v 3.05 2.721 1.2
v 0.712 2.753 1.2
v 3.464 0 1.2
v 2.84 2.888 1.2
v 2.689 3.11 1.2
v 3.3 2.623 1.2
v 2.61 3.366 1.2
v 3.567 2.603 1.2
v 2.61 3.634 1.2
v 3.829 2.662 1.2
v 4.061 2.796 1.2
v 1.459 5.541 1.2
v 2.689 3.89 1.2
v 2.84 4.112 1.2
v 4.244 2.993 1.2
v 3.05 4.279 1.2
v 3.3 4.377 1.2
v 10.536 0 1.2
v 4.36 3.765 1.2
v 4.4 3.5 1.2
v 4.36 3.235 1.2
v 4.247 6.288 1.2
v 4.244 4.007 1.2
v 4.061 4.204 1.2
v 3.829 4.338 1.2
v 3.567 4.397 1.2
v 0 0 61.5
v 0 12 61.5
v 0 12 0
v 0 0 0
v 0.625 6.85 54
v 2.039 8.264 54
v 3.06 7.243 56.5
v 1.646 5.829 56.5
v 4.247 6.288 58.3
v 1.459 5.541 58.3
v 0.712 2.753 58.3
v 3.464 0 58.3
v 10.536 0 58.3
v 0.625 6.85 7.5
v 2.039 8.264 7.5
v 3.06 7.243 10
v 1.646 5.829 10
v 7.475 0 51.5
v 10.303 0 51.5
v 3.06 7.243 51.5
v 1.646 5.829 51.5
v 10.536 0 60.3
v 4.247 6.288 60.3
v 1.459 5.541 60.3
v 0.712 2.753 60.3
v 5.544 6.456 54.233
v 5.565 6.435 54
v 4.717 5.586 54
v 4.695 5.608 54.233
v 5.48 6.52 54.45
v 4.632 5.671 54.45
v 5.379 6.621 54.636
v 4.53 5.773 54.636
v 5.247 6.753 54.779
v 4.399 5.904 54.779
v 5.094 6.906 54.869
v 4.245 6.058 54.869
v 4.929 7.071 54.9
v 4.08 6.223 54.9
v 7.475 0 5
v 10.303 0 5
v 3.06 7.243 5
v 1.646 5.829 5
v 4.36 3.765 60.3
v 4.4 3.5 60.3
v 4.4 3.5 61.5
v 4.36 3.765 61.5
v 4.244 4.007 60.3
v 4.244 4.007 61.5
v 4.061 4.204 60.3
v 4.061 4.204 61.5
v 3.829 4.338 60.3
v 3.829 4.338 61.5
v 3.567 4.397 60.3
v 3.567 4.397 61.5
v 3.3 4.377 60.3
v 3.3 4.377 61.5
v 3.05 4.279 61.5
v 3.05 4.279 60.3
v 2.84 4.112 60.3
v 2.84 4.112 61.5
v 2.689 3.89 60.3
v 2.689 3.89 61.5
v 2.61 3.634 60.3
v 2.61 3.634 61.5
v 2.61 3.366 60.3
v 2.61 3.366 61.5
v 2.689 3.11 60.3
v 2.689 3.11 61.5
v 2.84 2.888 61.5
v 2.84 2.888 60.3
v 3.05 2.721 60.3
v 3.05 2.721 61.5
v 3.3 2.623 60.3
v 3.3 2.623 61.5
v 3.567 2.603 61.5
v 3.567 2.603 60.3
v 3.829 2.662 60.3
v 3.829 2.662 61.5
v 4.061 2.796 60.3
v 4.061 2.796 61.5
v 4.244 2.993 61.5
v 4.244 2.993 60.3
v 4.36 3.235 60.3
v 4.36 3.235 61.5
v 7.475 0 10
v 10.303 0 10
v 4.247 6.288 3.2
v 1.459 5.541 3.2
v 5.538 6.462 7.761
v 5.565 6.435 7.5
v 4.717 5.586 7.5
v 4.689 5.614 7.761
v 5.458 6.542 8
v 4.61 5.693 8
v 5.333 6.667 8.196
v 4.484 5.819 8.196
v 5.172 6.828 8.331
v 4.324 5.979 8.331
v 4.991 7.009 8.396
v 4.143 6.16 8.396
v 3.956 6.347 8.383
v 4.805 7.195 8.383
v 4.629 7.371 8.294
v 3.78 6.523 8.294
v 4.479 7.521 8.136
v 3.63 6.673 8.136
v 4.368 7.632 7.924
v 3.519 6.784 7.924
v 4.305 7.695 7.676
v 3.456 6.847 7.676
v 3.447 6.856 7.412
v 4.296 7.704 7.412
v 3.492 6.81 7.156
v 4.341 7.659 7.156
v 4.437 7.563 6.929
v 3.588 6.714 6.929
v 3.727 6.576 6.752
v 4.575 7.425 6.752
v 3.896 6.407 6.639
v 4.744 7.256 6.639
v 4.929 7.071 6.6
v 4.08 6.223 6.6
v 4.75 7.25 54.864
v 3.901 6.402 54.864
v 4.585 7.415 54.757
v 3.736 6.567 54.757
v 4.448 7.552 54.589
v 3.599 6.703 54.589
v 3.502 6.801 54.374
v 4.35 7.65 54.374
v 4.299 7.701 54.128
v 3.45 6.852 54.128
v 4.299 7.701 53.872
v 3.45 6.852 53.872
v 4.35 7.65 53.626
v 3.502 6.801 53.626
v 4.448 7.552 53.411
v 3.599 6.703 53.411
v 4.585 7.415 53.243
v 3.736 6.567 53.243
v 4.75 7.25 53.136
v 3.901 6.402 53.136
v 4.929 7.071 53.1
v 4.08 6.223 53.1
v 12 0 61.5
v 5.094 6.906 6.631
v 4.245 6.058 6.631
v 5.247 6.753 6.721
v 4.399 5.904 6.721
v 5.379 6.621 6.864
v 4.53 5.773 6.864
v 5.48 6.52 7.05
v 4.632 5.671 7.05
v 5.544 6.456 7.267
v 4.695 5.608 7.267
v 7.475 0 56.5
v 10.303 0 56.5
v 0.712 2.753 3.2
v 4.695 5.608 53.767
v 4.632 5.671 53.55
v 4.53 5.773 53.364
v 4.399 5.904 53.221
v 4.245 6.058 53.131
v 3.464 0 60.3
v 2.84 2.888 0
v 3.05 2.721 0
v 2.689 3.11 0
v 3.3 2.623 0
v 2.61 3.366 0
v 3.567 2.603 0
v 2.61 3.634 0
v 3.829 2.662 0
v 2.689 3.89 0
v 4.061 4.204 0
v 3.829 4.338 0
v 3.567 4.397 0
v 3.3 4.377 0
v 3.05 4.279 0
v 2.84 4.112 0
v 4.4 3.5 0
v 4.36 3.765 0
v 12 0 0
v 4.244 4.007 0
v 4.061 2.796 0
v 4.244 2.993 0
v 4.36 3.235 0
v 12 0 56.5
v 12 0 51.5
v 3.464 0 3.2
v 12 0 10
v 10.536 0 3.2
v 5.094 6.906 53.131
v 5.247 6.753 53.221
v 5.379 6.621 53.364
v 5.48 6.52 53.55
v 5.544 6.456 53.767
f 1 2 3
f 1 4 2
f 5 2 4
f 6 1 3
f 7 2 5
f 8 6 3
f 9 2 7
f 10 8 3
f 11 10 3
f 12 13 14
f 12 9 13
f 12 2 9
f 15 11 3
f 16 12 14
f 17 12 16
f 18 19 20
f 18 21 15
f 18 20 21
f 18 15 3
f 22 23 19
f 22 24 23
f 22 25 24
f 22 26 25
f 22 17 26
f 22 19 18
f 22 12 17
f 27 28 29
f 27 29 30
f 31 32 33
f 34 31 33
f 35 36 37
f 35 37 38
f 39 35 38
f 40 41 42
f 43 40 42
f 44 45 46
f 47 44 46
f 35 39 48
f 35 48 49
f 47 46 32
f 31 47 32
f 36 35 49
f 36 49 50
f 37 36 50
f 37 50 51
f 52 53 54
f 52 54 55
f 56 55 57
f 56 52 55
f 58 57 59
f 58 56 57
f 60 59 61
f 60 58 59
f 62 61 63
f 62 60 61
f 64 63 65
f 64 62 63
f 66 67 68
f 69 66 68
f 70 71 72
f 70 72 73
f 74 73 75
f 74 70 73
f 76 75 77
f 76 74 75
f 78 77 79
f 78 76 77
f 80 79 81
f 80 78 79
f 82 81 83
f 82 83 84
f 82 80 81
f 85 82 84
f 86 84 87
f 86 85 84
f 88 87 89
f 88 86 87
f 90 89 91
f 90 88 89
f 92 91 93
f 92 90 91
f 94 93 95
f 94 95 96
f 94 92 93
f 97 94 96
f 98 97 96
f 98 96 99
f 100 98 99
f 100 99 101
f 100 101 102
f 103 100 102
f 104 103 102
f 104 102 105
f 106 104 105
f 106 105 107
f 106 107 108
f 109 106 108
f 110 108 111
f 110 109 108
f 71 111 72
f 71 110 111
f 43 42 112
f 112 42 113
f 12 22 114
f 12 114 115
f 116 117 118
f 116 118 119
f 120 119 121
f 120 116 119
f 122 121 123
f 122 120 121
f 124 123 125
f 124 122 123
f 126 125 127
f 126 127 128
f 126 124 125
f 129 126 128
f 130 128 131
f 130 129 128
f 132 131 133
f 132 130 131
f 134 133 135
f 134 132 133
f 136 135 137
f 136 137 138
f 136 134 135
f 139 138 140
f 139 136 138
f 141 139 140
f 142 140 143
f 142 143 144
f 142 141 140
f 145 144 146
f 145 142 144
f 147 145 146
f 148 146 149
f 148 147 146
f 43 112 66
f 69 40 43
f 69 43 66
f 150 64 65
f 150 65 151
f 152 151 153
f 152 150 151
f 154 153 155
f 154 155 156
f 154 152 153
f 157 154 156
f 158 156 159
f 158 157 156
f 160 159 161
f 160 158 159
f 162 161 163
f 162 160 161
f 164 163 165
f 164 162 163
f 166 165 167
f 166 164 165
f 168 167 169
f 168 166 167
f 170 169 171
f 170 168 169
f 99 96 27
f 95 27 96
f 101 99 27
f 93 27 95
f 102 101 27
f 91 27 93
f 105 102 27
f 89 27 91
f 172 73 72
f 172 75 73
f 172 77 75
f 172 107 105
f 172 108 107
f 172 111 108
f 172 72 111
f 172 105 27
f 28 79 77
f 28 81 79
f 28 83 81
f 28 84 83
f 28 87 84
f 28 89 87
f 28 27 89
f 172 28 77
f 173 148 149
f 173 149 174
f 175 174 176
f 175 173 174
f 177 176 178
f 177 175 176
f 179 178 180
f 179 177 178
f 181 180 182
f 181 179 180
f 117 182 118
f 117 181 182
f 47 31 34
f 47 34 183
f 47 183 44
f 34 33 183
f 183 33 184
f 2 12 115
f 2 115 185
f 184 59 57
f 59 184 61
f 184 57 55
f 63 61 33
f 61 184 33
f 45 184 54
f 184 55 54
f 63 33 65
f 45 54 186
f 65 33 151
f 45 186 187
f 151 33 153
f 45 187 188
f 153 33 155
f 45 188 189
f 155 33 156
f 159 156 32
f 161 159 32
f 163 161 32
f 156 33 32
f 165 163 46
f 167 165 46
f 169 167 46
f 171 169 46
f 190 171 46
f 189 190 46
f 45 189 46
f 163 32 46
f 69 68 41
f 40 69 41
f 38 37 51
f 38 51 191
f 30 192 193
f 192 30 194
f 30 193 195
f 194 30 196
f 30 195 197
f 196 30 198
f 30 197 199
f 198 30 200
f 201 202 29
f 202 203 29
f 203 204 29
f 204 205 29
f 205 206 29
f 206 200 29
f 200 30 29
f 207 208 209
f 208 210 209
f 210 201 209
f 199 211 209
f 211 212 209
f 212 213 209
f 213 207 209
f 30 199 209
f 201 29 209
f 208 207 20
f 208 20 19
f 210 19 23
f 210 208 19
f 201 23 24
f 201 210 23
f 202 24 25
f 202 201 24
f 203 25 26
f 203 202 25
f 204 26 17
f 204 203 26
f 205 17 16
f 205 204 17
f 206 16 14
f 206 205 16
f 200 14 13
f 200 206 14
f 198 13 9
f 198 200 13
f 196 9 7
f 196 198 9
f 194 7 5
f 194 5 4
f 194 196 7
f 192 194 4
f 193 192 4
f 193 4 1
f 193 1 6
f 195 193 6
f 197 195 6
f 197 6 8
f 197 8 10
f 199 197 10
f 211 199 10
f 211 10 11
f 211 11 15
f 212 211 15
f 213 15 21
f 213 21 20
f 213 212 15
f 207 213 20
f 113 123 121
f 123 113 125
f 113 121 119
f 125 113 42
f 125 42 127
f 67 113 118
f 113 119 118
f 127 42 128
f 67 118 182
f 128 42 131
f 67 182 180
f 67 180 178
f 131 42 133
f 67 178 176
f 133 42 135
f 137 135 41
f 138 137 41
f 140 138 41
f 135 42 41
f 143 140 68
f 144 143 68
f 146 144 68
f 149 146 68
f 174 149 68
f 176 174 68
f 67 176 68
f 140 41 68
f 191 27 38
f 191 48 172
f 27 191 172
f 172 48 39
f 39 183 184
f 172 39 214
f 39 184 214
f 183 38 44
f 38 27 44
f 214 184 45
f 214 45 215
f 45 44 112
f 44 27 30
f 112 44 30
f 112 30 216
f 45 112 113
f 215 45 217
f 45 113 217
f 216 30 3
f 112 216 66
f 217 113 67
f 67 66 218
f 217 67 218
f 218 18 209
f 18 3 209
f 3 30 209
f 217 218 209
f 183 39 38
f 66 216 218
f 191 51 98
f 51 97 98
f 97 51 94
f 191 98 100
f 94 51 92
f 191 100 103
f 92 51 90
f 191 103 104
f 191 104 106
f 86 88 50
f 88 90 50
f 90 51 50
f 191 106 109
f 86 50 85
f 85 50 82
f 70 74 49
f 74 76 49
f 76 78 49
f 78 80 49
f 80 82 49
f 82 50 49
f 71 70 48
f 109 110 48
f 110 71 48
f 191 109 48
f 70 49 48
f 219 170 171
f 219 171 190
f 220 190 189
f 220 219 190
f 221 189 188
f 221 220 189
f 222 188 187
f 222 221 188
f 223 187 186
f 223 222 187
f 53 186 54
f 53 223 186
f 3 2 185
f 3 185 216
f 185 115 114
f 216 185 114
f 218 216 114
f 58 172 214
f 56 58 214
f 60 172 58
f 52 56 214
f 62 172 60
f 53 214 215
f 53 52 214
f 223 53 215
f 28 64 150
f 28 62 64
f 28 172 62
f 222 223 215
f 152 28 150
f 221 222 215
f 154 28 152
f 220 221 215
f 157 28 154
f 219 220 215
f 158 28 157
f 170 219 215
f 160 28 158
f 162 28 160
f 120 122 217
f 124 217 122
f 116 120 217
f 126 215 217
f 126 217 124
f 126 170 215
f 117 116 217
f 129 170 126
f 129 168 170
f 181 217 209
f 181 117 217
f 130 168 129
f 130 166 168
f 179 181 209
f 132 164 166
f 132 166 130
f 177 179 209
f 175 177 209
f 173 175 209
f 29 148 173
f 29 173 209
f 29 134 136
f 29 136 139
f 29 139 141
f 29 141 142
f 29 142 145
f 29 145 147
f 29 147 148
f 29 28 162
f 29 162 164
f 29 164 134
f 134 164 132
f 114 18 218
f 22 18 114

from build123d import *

# Parameters (mm, degrees)
BOSS_EXTRUDE1_DEPTH = 61.5
CUT_EXTRUDE1_DEPTH  = 3.2
SKETCH1_5_R         = 0.9
BOSS_EXTRUDE2_DEPTH = 1.2
CUT_EXTRUDE2_DEPTH  = 3.2
BOSS_EXTRUDE3_START = -1.2
SKETCH2_4_R         = 0.9
BOSS_EXTRUDE3_DEPTH = 1.2
CUT_EXTRUDE3_DEPTH  = 3.2
SKETCH4_3_R         = 0.9
BOSS_EXTRUDE4_DEPTH = 1.2
CUT_EXTRUDE4_DEPTH  = 64.798510954


with BuildPart() as part:
    # Sketch1 → Boss-Extrude1 (new body)
    with BuildSketch(Plane.XY):
        Polygon((12, 0), (0, 12), (0, 0), align=None)
    extrude(amount=BOSS_EXTRUDE1_DEPTH)

    # Sketch1<4> → Cut-Extrude1 (cut)
    with BuildSketch(Plane.XY):
        Polygon((10.535533906, 0), (4.247146227, 6.288387679), (1.458758548, 5.541241452), (0.711612321, 2.752853773), (3.464466094, 0), align=None)
    extrude(amount=CUT_EXTRUDE1_DEPTH, mode=Mode.SUBTRACT)

    # Sketch1<5> → Boss-Extrude2 (add)
    with BuildSketch(Plane.XY):
        Polygon((10.535533906, 0), (4.247146227, 6.288387679), (1.458758548, 5.541241452), (0.711612321, 2.752853773), (3.464466094, 0), align=None)
        with Locations((3.5, 3.5)):
            Circle(SKETCH1_5_R, mode=Mode.SUBTRACT)
    extrude(amount=BOSS_EXTRUDE2_DEPTH)

    # Sketch2 → Cut-Extrude2 (cut)
    with BuildSketch(Plane.XY.offset(61.5)):
        Polygon((0.711612321, 2.752853773), (3.464466094, 0), (10.535533906, 0), (4.247146227, 6.288387679), (1.458758548, 5.541241452), align=None)
    extrude(amount=-CUT_EXTRUDE2_DEPTH, mode=Mode.SUBTRACT)

    # Sketch2<4> → Boss-Extrude3 (add)
    with BuildSketch(Plane.XY.offset(61.5).offset(BOSS_EXTRUDE3_START)):
        Polygon((0.711612321, 2.752853773), (3.464466094, 0), (10.535533906, 0), (4.247146227, 6.288387679), (1.458758548, 5.541241452), align=None)
        with Locations((3.5, 3.5)):
            Circle(SKETCH2_4_R, mode=Mode.SUBTRACT)
    extrude(amount=BOSS_EXTRUDE3_DEPTH)

    # Sketch4 → Cut-Extrude3 (cut)
    with BuildSketch(Plane(origin=(6, 6, 0), x_dir=(0, 0, -1), z_dir=(0.7071067811865477, 0.7071067811865475, 0))):
        Polygon((-51.5, -8.485281374), (-51.5, 2.958094299), (-54, 4.401469972), (-56.5, 2.958094299), (-56.5, -8.485281374), align=None)
        Polygon((-5, -8.485281374), (-5, 2.958094299), (-7.5, 4.401469972), (-10, 2.958094299), (-10, -8.485281374), align=None)
    extrude(amount=-CUT_EXTRUDE3_DEPTH, mode=Mode.SUBTRACT)

    # Sketch4<3> → Boss-Extrude4 (add)
    # profile 1 of 2: a face of its own
    with BuildSketch(Plane(origin=(6, 6, 0), x_dir=(0, 0, -1), z_dir=(0.7071067811865477, 0.7071067811865475, 0))):
        Polygon((-51.5, -8.485281374), (-51.5, 2.958094299), (-54, 4.401469972), (-56.5, 2.958094299), (-56.5, -8.485281374), align=None)
        with Locations((-54, 1.514718626)):
            Circle(SKETCH4_3_R, mode=Mode.SUBTRACT)
    # profile 2 of 2: a face of its own
    with BuildSketch(Plane(origin=(6, 6, 0), x_dir=(0, 0, -1), z_dir=(0.7071067811865477, 0.7071067811865475, 0))):
        Polygon((-5, -8.485281374), (-5, 2.958094299), (-7.5, 4.401469972), (-10, 2.958094299), (-10, -8.485281374), align=None)
        with Locations((-7.5, 1.514718626)):
            Circle(SKETCH4_3_R, mode=Mode.SUBTRACT)
    extrude(amount=-BOSS_EXTRUDE4_DEPTH)

    # Sketch1<6> → Cut-Extrude4 (cut, through all)
    with BuildSketch(Plane.XY):
        Polygon((12, -2.237434652), (12, 0), (10.535533906, 0), (7, 0), (3.5, 0), (3.464466094, 0), (0, 0), (0, -2.237434652), align=None)
    extrude(amount=CUT_EXTRUDE4_DEPTH, mode=Mode.SUBTRACT)


solid = part.part
